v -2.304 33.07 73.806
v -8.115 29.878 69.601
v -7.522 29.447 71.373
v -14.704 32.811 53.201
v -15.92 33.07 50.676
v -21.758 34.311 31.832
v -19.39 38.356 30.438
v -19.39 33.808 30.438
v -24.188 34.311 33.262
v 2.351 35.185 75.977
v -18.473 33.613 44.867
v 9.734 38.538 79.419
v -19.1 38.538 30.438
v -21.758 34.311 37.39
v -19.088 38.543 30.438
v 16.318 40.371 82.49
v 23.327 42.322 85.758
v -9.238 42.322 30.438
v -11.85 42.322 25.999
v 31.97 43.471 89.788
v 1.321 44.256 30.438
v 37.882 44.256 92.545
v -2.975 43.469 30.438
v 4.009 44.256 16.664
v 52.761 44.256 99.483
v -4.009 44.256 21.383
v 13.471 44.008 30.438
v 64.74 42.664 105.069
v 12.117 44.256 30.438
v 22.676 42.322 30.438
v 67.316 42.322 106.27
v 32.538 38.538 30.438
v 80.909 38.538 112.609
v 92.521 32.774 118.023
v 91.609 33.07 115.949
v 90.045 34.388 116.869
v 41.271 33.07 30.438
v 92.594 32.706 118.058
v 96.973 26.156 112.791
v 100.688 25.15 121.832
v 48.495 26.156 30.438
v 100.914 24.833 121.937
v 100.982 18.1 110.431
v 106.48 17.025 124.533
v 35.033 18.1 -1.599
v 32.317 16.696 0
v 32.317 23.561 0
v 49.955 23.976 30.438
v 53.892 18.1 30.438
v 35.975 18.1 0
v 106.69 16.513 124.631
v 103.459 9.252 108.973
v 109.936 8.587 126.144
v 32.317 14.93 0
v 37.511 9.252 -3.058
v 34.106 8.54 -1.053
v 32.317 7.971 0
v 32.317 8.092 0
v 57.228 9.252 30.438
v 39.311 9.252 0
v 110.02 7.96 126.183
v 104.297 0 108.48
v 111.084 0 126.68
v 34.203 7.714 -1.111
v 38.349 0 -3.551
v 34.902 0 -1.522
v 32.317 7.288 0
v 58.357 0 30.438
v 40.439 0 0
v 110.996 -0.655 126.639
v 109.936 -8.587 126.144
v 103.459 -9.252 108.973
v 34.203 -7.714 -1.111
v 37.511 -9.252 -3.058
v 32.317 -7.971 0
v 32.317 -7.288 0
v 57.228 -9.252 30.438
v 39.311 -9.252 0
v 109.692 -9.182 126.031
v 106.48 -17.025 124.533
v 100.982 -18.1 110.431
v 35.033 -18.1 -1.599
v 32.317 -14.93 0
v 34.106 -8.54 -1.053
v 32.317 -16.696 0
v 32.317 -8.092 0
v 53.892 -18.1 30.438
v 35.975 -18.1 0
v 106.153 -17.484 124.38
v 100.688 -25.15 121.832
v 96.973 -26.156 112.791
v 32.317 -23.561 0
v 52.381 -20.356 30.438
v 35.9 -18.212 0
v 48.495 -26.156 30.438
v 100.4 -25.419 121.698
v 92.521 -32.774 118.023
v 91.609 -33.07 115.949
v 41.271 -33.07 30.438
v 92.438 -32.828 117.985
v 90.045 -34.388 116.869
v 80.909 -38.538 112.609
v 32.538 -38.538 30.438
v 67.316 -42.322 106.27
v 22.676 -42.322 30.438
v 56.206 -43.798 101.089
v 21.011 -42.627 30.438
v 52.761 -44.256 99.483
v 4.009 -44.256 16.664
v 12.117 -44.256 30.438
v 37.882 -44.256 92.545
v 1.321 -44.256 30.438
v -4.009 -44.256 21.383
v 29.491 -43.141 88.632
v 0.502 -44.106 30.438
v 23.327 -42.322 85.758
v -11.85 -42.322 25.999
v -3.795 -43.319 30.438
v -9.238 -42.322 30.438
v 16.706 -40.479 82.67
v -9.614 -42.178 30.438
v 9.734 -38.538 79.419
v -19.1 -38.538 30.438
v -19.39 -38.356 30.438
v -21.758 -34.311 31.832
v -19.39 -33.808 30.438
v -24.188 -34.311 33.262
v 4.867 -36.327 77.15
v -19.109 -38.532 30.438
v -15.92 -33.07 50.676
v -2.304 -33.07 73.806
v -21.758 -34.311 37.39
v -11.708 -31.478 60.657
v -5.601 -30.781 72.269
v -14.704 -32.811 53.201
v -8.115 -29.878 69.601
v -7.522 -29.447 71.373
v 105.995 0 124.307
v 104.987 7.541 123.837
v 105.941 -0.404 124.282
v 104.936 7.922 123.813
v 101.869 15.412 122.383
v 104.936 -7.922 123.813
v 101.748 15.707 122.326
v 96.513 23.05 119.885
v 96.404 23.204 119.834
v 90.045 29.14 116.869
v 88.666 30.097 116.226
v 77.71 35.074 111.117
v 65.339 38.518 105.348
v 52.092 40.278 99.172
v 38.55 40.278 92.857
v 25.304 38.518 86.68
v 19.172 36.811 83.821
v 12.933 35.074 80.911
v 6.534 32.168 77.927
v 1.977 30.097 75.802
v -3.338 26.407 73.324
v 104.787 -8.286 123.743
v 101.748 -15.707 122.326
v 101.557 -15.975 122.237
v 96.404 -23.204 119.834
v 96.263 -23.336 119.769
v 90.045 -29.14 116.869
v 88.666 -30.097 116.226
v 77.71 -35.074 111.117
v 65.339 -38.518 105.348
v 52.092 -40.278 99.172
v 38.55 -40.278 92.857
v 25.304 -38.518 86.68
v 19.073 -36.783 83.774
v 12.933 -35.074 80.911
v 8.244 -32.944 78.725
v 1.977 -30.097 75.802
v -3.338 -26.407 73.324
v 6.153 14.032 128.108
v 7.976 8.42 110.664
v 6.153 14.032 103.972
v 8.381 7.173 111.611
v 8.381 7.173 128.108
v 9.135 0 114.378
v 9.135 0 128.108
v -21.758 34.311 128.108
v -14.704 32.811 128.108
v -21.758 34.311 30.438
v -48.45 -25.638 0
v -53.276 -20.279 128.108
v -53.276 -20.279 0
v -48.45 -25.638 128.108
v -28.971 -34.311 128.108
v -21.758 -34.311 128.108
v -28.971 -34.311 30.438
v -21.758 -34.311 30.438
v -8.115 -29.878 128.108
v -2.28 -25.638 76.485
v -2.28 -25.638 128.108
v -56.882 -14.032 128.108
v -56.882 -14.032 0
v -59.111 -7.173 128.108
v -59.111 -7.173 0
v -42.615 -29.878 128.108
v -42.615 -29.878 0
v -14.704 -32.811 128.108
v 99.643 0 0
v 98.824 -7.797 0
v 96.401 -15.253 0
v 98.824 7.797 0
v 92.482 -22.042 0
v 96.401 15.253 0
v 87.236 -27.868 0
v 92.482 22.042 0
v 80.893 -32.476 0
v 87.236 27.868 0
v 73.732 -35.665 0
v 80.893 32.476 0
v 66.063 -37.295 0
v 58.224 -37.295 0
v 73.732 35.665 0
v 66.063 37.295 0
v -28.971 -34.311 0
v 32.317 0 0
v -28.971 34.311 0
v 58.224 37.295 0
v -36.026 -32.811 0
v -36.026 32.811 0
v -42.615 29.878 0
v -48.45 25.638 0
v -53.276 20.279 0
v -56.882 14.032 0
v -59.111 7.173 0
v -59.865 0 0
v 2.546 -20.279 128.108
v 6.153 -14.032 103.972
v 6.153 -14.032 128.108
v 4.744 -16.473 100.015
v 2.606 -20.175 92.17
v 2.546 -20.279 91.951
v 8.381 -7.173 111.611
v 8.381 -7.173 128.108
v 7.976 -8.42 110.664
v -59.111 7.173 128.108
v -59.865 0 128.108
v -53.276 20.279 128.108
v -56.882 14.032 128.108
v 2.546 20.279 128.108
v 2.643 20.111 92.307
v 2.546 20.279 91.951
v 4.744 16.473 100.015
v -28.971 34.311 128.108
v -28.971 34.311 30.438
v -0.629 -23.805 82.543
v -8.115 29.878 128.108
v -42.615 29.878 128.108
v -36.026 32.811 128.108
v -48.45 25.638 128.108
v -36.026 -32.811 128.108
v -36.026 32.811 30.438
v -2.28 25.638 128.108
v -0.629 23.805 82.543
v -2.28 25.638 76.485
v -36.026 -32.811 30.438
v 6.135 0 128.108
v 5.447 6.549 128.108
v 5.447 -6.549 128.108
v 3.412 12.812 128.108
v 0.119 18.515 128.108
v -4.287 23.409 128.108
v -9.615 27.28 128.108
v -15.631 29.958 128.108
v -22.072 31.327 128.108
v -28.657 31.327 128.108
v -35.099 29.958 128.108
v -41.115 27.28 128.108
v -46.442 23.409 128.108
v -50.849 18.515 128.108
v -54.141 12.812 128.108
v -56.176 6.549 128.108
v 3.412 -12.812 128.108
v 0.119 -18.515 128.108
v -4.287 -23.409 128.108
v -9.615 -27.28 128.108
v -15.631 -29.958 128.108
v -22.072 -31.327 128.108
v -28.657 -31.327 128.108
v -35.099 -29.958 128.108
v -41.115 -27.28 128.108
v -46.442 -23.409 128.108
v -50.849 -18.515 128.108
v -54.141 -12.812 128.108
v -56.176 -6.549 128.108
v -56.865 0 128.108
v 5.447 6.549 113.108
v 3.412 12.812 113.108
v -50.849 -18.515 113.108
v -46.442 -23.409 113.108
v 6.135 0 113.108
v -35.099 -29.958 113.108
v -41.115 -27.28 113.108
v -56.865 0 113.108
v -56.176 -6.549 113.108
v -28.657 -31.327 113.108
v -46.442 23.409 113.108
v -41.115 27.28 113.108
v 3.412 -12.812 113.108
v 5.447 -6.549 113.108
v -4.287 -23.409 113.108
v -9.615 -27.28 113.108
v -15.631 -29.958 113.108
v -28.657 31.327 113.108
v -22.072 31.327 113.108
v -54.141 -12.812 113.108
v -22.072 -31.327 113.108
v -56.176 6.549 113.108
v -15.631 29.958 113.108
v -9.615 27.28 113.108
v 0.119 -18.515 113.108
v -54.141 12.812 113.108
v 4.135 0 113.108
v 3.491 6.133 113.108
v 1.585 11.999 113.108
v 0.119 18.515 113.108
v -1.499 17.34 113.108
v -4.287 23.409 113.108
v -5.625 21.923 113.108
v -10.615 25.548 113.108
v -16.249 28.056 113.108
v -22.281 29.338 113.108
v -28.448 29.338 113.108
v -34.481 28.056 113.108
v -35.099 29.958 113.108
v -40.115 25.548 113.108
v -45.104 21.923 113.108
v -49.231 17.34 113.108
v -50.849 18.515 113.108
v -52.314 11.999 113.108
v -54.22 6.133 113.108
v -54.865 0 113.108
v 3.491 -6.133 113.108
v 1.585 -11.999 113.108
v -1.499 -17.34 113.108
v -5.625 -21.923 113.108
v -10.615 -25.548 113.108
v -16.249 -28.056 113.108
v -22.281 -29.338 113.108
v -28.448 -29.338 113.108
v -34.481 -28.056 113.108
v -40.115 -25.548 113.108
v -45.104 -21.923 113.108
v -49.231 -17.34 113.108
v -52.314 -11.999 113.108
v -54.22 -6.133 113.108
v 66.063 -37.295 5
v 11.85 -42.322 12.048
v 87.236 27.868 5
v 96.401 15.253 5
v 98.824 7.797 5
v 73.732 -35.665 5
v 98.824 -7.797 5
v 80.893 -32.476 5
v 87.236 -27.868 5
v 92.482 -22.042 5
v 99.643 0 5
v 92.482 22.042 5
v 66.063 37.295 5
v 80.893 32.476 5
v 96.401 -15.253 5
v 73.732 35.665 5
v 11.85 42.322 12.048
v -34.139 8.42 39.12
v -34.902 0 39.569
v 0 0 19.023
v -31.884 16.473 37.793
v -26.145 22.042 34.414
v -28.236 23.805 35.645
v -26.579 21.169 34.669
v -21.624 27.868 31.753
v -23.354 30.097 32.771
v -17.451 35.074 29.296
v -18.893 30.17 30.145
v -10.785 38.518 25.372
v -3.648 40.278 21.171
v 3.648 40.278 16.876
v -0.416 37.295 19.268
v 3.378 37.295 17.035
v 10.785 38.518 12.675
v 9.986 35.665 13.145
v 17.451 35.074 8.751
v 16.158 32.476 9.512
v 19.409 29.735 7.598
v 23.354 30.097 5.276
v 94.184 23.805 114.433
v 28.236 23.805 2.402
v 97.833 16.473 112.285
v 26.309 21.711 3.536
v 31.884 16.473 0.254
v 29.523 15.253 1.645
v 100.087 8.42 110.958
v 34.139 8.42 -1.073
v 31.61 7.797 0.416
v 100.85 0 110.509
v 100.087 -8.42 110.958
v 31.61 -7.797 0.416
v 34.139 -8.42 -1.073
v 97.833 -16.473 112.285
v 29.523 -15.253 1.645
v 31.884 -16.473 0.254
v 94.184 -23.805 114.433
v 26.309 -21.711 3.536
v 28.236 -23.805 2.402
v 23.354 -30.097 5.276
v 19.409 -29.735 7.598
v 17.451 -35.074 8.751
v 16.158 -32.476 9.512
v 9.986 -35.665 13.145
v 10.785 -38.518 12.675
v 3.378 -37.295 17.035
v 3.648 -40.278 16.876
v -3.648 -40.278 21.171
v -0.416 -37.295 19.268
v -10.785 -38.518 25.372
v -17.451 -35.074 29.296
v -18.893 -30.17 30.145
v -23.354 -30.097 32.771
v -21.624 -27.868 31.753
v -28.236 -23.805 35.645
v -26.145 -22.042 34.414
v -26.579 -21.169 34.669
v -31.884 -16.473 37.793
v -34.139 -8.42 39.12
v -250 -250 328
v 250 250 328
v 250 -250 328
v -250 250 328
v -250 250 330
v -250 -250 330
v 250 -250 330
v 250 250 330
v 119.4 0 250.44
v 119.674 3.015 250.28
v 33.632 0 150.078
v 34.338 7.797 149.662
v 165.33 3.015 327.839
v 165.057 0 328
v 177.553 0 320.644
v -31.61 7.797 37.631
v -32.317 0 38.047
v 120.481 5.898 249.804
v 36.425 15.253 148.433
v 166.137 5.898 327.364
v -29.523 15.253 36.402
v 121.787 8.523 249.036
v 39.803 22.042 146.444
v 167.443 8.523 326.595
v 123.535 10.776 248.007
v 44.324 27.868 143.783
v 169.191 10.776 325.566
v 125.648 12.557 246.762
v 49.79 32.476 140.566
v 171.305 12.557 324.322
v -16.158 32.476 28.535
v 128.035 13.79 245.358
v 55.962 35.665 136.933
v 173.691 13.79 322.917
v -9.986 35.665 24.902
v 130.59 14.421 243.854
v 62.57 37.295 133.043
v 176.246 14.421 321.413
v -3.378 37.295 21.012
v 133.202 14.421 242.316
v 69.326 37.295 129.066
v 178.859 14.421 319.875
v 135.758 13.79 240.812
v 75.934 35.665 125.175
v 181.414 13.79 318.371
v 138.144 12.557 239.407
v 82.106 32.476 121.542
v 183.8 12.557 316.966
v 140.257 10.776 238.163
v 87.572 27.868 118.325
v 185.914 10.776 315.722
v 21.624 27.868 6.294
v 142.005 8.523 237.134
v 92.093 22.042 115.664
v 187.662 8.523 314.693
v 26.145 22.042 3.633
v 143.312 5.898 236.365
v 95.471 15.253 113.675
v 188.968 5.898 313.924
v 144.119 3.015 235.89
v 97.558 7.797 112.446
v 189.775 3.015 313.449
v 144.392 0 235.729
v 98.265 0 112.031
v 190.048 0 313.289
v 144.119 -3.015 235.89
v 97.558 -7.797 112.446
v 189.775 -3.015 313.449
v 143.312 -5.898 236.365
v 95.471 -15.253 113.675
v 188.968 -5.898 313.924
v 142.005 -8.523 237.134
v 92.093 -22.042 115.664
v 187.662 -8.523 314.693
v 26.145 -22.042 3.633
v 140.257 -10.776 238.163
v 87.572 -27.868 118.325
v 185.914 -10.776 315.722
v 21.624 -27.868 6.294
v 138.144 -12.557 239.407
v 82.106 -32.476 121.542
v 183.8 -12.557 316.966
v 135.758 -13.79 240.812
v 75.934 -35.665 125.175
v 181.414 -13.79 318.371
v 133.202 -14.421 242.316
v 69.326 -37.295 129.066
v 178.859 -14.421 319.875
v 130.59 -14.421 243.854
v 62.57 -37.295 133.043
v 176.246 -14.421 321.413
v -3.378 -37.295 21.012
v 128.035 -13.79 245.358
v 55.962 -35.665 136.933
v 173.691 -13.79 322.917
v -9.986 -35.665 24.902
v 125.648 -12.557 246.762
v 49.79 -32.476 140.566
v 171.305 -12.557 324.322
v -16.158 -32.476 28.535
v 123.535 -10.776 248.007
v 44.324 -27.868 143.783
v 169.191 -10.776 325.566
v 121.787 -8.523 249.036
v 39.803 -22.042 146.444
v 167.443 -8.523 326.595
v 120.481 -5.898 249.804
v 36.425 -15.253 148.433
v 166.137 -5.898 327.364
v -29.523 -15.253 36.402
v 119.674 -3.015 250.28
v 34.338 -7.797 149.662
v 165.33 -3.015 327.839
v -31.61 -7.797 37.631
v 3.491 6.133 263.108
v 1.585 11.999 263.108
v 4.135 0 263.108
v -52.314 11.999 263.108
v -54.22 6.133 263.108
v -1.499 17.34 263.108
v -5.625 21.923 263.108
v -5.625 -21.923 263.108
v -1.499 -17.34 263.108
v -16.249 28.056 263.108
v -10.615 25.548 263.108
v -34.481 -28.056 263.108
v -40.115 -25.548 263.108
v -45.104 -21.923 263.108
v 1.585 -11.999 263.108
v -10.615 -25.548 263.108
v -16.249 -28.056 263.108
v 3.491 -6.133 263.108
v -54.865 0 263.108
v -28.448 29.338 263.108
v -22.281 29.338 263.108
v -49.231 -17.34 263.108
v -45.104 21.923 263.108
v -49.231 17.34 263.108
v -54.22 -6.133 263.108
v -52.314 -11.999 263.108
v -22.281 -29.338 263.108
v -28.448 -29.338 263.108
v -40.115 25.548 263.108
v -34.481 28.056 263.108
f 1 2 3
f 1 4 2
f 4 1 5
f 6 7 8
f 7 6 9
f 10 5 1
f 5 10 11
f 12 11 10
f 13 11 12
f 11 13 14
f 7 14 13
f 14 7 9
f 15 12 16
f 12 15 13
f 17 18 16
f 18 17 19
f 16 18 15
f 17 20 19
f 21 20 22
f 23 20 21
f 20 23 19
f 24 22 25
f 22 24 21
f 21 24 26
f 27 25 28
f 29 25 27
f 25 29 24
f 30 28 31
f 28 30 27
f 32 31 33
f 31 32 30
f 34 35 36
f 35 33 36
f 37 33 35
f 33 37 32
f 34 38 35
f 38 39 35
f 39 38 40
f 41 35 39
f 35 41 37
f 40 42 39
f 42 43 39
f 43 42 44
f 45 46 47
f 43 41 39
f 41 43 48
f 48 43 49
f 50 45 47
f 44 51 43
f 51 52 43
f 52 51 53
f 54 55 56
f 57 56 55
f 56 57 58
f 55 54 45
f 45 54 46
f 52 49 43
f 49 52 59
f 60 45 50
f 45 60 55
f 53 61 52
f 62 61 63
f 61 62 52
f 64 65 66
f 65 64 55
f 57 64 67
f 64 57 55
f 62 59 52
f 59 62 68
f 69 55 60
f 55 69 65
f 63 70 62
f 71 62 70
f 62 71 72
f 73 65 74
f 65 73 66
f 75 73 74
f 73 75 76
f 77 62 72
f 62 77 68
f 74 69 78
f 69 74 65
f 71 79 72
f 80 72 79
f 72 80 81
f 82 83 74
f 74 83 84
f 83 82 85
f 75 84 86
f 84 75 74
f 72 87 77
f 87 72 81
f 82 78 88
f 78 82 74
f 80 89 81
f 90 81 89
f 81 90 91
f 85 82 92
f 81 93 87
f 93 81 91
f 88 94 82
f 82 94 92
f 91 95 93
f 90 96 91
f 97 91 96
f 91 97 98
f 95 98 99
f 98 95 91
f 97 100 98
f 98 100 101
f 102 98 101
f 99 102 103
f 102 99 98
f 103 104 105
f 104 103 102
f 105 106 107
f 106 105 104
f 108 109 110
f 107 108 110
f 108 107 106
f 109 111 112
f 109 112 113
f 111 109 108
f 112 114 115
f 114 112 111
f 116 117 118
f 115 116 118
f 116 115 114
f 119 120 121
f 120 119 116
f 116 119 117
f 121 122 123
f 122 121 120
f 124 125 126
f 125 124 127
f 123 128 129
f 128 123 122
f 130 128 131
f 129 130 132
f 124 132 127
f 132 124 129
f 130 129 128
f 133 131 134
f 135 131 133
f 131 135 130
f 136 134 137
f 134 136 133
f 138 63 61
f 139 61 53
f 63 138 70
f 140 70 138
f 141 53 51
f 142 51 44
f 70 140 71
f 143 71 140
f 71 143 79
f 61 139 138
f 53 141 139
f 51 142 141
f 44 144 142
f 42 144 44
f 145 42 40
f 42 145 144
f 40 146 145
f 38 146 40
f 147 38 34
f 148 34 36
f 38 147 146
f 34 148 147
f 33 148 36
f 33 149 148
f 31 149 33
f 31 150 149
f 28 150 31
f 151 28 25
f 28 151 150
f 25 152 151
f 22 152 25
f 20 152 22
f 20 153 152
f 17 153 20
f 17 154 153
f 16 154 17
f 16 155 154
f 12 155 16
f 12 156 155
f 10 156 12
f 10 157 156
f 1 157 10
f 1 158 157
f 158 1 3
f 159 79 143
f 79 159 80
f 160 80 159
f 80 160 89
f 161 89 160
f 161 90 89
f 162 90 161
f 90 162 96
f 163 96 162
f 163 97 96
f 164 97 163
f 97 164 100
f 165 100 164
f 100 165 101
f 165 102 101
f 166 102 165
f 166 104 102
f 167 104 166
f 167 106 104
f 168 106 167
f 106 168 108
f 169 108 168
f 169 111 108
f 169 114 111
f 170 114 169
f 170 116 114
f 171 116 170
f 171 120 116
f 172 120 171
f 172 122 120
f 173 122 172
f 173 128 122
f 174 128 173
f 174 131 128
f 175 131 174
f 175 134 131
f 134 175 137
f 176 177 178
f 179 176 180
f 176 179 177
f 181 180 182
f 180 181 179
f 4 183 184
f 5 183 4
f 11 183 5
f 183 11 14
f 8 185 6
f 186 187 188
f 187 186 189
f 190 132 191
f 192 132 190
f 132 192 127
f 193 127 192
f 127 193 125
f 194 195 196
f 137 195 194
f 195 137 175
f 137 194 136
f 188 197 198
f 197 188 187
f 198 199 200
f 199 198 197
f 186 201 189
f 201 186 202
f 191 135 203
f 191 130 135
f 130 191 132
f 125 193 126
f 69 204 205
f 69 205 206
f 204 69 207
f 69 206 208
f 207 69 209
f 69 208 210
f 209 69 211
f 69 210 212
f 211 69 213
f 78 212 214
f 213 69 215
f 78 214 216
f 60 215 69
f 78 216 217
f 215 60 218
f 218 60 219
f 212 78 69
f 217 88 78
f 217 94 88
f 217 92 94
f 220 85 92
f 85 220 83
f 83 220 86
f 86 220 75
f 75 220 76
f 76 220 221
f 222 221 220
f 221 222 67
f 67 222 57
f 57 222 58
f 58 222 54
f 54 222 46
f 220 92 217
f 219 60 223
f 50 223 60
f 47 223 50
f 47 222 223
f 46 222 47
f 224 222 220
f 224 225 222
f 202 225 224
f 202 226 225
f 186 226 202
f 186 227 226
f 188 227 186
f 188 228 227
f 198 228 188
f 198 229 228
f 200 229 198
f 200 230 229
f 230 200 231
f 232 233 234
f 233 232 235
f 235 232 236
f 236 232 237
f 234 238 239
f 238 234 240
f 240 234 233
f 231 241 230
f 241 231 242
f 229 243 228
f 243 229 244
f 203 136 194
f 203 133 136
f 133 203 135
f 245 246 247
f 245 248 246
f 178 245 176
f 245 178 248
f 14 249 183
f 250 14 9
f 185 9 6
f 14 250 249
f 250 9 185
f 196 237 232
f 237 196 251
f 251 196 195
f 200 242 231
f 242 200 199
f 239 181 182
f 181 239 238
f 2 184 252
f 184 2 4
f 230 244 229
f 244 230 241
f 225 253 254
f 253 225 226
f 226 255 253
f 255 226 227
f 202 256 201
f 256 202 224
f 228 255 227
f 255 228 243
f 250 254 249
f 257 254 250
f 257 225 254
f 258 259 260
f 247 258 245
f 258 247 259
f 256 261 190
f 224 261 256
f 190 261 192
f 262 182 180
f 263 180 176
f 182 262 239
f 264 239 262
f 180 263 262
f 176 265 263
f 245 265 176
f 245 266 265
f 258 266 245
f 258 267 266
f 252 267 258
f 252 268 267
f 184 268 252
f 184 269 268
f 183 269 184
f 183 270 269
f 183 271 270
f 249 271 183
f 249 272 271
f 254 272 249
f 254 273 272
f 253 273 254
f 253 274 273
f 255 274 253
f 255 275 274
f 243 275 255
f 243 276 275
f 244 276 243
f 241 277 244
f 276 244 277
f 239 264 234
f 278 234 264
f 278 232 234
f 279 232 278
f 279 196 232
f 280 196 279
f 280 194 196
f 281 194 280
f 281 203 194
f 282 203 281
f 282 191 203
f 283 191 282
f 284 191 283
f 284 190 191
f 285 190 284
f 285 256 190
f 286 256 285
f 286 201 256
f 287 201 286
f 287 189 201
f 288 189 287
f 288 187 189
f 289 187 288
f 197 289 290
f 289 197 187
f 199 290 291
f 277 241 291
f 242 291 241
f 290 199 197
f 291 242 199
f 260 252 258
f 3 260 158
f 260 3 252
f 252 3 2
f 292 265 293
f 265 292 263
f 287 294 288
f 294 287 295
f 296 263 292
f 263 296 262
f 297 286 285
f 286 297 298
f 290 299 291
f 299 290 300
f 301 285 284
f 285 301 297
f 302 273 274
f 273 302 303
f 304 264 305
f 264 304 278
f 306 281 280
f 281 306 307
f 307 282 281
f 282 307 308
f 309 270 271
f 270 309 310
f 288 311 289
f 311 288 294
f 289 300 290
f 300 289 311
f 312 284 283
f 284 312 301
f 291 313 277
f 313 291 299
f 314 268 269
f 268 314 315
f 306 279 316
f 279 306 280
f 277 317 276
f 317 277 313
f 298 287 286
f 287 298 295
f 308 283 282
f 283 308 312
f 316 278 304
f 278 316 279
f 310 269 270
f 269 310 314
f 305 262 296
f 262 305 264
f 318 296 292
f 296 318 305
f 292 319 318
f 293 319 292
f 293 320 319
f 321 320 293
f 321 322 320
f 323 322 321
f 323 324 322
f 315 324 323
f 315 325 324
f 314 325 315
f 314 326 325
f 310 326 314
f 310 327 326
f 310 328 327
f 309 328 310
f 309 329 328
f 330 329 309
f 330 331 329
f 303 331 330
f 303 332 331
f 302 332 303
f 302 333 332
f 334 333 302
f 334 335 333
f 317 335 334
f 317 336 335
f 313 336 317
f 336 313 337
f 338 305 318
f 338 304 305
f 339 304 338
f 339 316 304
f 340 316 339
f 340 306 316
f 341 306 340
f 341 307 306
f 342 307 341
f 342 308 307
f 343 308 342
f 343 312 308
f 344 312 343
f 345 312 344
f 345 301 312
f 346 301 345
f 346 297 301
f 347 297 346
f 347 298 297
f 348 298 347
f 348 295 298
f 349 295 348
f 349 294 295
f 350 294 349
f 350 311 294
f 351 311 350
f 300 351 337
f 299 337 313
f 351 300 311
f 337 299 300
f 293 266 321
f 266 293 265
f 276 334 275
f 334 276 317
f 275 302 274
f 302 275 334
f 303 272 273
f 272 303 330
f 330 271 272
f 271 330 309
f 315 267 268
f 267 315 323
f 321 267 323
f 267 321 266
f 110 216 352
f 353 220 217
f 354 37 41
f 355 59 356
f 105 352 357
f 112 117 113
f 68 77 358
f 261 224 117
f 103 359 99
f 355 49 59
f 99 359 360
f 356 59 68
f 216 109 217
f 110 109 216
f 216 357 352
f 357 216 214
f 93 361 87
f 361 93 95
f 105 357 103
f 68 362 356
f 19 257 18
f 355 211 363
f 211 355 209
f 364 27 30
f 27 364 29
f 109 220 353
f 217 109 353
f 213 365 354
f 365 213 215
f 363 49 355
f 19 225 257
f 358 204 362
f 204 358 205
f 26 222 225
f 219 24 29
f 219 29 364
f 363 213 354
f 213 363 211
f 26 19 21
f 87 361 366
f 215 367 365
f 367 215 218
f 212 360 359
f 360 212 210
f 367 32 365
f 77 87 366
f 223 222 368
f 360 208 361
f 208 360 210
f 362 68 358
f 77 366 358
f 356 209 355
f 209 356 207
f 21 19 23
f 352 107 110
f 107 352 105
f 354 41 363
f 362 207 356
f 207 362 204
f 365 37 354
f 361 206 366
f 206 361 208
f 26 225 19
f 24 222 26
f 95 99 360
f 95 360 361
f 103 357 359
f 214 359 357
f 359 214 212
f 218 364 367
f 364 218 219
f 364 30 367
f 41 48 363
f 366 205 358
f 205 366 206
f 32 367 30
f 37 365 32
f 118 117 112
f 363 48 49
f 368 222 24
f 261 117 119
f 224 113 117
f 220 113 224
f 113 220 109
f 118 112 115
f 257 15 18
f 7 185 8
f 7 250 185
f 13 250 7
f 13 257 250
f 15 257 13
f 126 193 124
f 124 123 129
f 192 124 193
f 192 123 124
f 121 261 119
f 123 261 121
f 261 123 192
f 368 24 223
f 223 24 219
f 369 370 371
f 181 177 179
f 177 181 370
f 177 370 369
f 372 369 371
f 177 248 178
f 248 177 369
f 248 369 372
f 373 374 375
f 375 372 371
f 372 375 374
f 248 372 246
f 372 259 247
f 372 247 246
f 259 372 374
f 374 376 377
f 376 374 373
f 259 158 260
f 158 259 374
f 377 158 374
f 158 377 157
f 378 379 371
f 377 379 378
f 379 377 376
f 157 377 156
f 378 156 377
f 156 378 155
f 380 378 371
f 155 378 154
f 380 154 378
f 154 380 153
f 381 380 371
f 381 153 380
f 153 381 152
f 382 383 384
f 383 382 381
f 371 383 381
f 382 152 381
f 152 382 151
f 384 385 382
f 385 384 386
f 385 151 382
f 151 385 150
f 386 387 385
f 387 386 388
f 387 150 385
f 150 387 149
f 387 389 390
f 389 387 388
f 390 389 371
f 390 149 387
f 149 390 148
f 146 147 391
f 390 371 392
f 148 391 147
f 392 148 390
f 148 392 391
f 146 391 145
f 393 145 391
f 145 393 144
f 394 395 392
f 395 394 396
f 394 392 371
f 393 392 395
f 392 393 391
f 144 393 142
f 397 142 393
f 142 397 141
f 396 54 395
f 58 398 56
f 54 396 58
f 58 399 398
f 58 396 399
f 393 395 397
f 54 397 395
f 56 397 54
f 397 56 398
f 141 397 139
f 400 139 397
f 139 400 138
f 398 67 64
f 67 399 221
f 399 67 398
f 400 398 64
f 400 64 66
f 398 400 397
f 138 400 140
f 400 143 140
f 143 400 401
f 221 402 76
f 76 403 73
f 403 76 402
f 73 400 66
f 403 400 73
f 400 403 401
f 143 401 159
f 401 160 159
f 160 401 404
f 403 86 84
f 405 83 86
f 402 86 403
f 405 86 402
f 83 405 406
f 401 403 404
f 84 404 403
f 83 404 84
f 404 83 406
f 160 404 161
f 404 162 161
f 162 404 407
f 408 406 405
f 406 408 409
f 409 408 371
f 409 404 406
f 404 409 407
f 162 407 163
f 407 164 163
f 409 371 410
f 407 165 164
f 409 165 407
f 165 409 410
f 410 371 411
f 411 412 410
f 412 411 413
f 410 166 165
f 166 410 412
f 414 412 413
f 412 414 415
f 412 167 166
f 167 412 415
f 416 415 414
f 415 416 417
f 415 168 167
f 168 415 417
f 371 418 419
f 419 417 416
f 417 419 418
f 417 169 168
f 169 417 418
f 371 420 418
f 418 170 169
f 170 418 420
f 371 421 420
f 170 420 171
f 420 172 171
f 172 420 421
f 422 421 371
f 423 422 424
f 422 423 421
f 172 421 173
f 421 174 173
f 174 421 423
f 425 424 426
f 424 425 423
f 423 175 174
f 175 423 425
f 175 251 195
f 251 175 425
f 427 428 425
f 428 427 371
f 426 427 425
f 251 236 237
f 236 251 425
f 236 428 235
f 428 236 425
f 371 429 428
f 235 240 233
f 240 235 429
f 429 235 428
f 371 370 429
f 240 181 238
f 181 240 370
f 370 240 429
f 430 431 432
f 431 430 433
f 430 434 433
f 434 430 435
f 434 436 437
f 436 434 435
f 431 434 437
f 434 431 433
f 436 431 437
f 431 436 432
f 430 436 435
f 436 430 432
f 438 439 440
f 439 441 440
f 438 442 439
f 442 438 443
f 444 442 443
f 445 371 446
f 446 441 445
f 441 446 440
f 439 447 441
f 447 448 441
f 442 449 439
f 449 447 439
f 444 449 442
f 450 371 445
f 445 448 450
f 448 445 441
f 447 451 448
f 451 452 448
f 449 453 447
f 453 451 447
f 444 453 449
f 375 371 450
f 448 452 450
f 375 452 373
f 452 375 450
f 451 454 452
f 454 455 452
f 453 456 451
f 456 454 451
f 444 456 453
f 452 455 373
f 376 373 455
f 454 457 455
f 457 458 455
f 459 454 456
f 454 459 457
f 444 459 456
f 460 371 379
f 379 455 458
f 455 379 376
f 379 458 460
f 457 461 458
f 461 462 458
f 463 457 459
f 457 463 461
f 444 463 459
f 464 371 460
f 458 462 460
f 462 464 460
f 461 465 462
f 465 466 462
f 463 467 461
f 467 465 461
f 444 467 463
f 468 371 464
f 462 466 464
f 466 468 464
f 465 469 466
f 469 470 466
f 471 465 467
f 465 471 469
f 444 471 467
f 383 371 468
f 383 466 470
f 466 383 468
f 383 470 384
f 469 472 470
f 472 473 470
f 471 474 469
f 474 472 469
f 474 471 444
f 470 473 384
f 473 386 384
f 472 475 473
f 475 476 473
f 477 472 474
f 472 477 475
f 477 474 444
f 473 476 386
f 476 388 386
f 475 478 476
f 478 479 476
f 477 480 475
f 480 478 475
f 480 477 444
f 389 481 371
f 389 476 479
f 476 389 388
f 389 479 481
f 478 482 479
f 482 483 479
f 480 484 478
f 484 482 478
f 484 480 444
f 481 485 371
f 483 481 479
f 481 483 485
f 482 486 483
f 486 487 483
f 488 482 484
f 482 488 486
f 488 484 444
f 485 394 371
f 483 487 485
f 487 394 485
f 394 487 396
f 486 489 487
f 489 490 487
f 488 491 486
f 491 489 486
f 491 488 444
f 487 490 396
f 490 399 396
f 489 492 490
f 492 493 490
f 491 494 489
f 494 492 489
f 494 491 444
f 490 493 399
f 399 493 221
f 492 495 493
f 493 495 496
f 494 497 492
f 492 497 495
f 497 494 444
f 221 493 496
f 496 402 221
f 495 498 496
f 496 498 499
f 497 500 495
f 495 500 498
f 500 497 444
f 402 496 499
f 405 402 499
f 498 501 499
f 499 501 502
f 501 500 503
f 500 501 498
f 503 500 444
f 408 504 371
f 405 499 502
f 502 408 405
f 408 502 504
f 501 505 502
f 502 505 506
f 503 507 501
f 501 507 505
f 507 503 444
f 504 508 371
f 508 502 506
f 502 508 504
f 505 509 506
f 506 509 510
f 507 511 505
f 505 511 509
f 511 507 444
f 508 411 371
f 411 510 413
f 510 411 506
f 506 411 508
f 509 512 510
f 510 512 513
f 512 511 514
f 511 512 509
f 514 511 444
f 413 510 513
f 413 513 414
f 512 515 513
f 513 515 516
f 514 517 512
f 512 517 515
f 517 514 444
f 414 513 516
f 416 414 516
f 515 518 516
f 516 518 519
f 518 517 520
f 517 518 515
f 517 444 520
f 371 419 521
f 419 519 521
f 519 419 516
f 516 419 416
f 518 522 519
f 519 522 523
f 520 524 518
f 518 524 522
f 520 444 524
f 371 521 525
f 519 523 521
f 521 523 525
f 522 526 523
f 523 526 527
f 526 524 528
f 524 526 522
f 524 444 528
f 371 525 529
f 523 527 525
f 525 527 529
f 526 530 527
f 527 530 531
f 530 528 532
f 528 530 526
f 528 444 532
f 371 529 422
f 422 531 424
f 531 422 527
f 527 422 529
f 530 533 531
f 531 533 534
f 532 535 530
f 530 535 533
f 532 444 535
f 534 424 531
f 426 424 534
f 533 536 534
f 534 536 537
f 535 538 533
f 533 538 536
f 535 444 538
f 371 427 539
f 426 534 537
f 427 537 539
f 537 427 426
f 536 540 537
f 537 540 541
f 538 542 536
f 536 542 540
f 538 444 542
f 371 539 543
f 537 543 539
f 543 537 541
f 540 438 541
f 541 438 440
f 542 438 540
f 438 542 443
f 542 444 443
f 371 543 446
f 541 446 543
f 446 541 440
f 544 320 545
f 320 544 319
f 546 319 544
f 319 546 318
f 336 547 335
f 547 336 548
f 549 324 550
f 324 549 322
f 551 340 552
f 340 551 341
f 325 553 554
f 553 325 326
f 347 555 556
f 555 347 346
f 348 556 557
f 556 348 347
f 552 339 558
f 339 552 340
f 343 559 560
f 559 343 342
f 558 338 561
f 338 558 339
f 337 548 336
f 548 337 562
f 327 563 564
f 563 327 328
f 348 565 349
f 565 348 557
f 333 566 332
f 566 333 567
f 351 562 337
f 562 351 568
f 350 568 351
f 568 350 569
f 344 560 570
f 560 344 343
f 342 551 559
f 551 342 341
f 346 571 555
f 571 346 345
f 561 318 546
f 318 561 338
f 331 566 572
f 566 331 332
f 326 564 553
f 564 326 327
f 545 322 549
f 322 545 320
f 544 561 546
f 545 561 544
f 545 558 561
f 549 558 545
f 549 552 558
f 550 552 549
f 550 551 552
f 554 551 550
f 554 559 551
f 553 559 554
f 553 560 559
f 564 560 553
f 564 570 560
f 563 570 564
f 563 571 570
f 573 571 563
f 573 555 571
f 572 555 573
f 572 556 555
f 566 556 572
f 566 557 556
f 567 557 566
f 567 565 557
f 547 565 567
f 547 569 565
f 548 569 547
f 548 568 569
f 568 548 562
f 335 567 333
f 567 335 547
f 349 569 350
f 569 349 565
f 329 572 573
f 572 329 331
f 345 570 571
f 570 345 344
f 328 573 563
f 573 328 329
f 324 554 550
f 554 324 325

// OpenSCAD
// schlegelflaschen too tall to store vertically?

H = 350; // can be 330
H_BODY = 130;
H_SHOULDER = 130;
D_BASE = 75;
D_NECK = 29;

SHELF_Z = 328;
TARGET_Z = SHELF_Z;

SHELL_OUTER = 7;
SHELL_THICK = 4;

CAN_D = 59;

CAN_CYLINDER = true;
CAN_RIM_H = 15;

PRONGS = false;

module schlegelflaschen(expand_r=0)
rotate_extrude()
polygon([
    [0, 0],
    [D_BASE / 2 + expand_r, 0],
    [D_BASE / 2 + expand_r, H_BODY],
    [D_NECK / 2 + expand_r, H_BODY + H_SHOULDER],
    [D_NECK / 2 + expand_r, H],
    [0, H]
])
    ;

// exact angle to fit a section of a cone in
// (i.e. we solve `H cos(x) + [average]W sin(x) = T` for x)
function angle_fit(h, w, t) = 2 * atan(
    (w + sqrt(h * h + w * w - t * t))
    / (h + t)
)
    ;

ANGLE = angle_fit(H, (D_BASE + D_NECK) / 2, TARGET_Z);
echo(ANGLE);

SHOE_H = D_BASE * sin(ANGLE) * 0.8;

CAN_Z = H * cos(ANGLE) / 2 * 0.75;

module angled_schlegelflaschen(expand_r=0)
translate([0, 0, D_BASE * sin(ANGLE) / 2])
rotate([0, ANGLE, 0])
schlegelflaschen(expand_r=expand_r)
    ;

module can_330(expand_r=0)
linear_extrude(115.2)
circle(d=CAN_D + expand_r * 2)
    ;

module can_440(expand_r=0)
linear_extrude(150)
circle(d=CAN_D + expand_r * 2)
    ;

module can_pos_xy()
// completely eyeballed can balance pos
translate([-50 * sin(ANGLE), 0])
children()
    ;

module schlegelflaschen_holder()
difference() {
    union() {
        intersection() {
            angled_schlegelflaschen(expand_r=SHELL_OUTER)
                ;
            // angular cutoff to support bottle, kinda arbitrary
            rotate([0, -25, 0])
            linear_extrude(H * cos(ANGLE) / 2 * 0.9, center=true)
            square(999, center=true)
                ;
        }
            ;
        hull() {
            intersection() {
                angled_schlegelflaschen(expand_r=SHELL_OUTER)
                    ;
                linear_extrude(SHOE_H)
                square(999, center=true)
                    ;
            }
                ;
            linear_extrude(5)
            translate([H * sin(ANGLE) * 0.35, 0])
            circle(d=D_BASE)
                ;
            linear_extrude(SHOE_H)
            can_pos_xy()
            circle(d=CAN_D + 10)
                ;
        }
            ;
        if(CAN_CYLINDER)
        can_pos_xy()
        difference() {
            linear_extrude(CAN_Z + CAN_RIM_H)
            circle(d=CAN_D + 10)
                ;
            translate([0, 0, CAN_Z])
            can_440(expand_r=2)
                ;
        }
    }
        ;
    angled_schlegelflaschen(expand_r=SHELL_OUTER - SHELL_THICK)
        ;
}
    ;

color("red", alpha=0.3)
translate([0, 0, SHELF_Z])
linear_extrude(2)
square(500, center=true)
    ;

color("green", alpha=0.5)
angled_schlegelflaschen()
    ;

color("blue", alpha=0.5)
translate([0, 0, CAN_Z])
can_pos_xy()
can_440()
    ;

color(alpha=0.5)
schlegelflaschen_holder()
    ;
